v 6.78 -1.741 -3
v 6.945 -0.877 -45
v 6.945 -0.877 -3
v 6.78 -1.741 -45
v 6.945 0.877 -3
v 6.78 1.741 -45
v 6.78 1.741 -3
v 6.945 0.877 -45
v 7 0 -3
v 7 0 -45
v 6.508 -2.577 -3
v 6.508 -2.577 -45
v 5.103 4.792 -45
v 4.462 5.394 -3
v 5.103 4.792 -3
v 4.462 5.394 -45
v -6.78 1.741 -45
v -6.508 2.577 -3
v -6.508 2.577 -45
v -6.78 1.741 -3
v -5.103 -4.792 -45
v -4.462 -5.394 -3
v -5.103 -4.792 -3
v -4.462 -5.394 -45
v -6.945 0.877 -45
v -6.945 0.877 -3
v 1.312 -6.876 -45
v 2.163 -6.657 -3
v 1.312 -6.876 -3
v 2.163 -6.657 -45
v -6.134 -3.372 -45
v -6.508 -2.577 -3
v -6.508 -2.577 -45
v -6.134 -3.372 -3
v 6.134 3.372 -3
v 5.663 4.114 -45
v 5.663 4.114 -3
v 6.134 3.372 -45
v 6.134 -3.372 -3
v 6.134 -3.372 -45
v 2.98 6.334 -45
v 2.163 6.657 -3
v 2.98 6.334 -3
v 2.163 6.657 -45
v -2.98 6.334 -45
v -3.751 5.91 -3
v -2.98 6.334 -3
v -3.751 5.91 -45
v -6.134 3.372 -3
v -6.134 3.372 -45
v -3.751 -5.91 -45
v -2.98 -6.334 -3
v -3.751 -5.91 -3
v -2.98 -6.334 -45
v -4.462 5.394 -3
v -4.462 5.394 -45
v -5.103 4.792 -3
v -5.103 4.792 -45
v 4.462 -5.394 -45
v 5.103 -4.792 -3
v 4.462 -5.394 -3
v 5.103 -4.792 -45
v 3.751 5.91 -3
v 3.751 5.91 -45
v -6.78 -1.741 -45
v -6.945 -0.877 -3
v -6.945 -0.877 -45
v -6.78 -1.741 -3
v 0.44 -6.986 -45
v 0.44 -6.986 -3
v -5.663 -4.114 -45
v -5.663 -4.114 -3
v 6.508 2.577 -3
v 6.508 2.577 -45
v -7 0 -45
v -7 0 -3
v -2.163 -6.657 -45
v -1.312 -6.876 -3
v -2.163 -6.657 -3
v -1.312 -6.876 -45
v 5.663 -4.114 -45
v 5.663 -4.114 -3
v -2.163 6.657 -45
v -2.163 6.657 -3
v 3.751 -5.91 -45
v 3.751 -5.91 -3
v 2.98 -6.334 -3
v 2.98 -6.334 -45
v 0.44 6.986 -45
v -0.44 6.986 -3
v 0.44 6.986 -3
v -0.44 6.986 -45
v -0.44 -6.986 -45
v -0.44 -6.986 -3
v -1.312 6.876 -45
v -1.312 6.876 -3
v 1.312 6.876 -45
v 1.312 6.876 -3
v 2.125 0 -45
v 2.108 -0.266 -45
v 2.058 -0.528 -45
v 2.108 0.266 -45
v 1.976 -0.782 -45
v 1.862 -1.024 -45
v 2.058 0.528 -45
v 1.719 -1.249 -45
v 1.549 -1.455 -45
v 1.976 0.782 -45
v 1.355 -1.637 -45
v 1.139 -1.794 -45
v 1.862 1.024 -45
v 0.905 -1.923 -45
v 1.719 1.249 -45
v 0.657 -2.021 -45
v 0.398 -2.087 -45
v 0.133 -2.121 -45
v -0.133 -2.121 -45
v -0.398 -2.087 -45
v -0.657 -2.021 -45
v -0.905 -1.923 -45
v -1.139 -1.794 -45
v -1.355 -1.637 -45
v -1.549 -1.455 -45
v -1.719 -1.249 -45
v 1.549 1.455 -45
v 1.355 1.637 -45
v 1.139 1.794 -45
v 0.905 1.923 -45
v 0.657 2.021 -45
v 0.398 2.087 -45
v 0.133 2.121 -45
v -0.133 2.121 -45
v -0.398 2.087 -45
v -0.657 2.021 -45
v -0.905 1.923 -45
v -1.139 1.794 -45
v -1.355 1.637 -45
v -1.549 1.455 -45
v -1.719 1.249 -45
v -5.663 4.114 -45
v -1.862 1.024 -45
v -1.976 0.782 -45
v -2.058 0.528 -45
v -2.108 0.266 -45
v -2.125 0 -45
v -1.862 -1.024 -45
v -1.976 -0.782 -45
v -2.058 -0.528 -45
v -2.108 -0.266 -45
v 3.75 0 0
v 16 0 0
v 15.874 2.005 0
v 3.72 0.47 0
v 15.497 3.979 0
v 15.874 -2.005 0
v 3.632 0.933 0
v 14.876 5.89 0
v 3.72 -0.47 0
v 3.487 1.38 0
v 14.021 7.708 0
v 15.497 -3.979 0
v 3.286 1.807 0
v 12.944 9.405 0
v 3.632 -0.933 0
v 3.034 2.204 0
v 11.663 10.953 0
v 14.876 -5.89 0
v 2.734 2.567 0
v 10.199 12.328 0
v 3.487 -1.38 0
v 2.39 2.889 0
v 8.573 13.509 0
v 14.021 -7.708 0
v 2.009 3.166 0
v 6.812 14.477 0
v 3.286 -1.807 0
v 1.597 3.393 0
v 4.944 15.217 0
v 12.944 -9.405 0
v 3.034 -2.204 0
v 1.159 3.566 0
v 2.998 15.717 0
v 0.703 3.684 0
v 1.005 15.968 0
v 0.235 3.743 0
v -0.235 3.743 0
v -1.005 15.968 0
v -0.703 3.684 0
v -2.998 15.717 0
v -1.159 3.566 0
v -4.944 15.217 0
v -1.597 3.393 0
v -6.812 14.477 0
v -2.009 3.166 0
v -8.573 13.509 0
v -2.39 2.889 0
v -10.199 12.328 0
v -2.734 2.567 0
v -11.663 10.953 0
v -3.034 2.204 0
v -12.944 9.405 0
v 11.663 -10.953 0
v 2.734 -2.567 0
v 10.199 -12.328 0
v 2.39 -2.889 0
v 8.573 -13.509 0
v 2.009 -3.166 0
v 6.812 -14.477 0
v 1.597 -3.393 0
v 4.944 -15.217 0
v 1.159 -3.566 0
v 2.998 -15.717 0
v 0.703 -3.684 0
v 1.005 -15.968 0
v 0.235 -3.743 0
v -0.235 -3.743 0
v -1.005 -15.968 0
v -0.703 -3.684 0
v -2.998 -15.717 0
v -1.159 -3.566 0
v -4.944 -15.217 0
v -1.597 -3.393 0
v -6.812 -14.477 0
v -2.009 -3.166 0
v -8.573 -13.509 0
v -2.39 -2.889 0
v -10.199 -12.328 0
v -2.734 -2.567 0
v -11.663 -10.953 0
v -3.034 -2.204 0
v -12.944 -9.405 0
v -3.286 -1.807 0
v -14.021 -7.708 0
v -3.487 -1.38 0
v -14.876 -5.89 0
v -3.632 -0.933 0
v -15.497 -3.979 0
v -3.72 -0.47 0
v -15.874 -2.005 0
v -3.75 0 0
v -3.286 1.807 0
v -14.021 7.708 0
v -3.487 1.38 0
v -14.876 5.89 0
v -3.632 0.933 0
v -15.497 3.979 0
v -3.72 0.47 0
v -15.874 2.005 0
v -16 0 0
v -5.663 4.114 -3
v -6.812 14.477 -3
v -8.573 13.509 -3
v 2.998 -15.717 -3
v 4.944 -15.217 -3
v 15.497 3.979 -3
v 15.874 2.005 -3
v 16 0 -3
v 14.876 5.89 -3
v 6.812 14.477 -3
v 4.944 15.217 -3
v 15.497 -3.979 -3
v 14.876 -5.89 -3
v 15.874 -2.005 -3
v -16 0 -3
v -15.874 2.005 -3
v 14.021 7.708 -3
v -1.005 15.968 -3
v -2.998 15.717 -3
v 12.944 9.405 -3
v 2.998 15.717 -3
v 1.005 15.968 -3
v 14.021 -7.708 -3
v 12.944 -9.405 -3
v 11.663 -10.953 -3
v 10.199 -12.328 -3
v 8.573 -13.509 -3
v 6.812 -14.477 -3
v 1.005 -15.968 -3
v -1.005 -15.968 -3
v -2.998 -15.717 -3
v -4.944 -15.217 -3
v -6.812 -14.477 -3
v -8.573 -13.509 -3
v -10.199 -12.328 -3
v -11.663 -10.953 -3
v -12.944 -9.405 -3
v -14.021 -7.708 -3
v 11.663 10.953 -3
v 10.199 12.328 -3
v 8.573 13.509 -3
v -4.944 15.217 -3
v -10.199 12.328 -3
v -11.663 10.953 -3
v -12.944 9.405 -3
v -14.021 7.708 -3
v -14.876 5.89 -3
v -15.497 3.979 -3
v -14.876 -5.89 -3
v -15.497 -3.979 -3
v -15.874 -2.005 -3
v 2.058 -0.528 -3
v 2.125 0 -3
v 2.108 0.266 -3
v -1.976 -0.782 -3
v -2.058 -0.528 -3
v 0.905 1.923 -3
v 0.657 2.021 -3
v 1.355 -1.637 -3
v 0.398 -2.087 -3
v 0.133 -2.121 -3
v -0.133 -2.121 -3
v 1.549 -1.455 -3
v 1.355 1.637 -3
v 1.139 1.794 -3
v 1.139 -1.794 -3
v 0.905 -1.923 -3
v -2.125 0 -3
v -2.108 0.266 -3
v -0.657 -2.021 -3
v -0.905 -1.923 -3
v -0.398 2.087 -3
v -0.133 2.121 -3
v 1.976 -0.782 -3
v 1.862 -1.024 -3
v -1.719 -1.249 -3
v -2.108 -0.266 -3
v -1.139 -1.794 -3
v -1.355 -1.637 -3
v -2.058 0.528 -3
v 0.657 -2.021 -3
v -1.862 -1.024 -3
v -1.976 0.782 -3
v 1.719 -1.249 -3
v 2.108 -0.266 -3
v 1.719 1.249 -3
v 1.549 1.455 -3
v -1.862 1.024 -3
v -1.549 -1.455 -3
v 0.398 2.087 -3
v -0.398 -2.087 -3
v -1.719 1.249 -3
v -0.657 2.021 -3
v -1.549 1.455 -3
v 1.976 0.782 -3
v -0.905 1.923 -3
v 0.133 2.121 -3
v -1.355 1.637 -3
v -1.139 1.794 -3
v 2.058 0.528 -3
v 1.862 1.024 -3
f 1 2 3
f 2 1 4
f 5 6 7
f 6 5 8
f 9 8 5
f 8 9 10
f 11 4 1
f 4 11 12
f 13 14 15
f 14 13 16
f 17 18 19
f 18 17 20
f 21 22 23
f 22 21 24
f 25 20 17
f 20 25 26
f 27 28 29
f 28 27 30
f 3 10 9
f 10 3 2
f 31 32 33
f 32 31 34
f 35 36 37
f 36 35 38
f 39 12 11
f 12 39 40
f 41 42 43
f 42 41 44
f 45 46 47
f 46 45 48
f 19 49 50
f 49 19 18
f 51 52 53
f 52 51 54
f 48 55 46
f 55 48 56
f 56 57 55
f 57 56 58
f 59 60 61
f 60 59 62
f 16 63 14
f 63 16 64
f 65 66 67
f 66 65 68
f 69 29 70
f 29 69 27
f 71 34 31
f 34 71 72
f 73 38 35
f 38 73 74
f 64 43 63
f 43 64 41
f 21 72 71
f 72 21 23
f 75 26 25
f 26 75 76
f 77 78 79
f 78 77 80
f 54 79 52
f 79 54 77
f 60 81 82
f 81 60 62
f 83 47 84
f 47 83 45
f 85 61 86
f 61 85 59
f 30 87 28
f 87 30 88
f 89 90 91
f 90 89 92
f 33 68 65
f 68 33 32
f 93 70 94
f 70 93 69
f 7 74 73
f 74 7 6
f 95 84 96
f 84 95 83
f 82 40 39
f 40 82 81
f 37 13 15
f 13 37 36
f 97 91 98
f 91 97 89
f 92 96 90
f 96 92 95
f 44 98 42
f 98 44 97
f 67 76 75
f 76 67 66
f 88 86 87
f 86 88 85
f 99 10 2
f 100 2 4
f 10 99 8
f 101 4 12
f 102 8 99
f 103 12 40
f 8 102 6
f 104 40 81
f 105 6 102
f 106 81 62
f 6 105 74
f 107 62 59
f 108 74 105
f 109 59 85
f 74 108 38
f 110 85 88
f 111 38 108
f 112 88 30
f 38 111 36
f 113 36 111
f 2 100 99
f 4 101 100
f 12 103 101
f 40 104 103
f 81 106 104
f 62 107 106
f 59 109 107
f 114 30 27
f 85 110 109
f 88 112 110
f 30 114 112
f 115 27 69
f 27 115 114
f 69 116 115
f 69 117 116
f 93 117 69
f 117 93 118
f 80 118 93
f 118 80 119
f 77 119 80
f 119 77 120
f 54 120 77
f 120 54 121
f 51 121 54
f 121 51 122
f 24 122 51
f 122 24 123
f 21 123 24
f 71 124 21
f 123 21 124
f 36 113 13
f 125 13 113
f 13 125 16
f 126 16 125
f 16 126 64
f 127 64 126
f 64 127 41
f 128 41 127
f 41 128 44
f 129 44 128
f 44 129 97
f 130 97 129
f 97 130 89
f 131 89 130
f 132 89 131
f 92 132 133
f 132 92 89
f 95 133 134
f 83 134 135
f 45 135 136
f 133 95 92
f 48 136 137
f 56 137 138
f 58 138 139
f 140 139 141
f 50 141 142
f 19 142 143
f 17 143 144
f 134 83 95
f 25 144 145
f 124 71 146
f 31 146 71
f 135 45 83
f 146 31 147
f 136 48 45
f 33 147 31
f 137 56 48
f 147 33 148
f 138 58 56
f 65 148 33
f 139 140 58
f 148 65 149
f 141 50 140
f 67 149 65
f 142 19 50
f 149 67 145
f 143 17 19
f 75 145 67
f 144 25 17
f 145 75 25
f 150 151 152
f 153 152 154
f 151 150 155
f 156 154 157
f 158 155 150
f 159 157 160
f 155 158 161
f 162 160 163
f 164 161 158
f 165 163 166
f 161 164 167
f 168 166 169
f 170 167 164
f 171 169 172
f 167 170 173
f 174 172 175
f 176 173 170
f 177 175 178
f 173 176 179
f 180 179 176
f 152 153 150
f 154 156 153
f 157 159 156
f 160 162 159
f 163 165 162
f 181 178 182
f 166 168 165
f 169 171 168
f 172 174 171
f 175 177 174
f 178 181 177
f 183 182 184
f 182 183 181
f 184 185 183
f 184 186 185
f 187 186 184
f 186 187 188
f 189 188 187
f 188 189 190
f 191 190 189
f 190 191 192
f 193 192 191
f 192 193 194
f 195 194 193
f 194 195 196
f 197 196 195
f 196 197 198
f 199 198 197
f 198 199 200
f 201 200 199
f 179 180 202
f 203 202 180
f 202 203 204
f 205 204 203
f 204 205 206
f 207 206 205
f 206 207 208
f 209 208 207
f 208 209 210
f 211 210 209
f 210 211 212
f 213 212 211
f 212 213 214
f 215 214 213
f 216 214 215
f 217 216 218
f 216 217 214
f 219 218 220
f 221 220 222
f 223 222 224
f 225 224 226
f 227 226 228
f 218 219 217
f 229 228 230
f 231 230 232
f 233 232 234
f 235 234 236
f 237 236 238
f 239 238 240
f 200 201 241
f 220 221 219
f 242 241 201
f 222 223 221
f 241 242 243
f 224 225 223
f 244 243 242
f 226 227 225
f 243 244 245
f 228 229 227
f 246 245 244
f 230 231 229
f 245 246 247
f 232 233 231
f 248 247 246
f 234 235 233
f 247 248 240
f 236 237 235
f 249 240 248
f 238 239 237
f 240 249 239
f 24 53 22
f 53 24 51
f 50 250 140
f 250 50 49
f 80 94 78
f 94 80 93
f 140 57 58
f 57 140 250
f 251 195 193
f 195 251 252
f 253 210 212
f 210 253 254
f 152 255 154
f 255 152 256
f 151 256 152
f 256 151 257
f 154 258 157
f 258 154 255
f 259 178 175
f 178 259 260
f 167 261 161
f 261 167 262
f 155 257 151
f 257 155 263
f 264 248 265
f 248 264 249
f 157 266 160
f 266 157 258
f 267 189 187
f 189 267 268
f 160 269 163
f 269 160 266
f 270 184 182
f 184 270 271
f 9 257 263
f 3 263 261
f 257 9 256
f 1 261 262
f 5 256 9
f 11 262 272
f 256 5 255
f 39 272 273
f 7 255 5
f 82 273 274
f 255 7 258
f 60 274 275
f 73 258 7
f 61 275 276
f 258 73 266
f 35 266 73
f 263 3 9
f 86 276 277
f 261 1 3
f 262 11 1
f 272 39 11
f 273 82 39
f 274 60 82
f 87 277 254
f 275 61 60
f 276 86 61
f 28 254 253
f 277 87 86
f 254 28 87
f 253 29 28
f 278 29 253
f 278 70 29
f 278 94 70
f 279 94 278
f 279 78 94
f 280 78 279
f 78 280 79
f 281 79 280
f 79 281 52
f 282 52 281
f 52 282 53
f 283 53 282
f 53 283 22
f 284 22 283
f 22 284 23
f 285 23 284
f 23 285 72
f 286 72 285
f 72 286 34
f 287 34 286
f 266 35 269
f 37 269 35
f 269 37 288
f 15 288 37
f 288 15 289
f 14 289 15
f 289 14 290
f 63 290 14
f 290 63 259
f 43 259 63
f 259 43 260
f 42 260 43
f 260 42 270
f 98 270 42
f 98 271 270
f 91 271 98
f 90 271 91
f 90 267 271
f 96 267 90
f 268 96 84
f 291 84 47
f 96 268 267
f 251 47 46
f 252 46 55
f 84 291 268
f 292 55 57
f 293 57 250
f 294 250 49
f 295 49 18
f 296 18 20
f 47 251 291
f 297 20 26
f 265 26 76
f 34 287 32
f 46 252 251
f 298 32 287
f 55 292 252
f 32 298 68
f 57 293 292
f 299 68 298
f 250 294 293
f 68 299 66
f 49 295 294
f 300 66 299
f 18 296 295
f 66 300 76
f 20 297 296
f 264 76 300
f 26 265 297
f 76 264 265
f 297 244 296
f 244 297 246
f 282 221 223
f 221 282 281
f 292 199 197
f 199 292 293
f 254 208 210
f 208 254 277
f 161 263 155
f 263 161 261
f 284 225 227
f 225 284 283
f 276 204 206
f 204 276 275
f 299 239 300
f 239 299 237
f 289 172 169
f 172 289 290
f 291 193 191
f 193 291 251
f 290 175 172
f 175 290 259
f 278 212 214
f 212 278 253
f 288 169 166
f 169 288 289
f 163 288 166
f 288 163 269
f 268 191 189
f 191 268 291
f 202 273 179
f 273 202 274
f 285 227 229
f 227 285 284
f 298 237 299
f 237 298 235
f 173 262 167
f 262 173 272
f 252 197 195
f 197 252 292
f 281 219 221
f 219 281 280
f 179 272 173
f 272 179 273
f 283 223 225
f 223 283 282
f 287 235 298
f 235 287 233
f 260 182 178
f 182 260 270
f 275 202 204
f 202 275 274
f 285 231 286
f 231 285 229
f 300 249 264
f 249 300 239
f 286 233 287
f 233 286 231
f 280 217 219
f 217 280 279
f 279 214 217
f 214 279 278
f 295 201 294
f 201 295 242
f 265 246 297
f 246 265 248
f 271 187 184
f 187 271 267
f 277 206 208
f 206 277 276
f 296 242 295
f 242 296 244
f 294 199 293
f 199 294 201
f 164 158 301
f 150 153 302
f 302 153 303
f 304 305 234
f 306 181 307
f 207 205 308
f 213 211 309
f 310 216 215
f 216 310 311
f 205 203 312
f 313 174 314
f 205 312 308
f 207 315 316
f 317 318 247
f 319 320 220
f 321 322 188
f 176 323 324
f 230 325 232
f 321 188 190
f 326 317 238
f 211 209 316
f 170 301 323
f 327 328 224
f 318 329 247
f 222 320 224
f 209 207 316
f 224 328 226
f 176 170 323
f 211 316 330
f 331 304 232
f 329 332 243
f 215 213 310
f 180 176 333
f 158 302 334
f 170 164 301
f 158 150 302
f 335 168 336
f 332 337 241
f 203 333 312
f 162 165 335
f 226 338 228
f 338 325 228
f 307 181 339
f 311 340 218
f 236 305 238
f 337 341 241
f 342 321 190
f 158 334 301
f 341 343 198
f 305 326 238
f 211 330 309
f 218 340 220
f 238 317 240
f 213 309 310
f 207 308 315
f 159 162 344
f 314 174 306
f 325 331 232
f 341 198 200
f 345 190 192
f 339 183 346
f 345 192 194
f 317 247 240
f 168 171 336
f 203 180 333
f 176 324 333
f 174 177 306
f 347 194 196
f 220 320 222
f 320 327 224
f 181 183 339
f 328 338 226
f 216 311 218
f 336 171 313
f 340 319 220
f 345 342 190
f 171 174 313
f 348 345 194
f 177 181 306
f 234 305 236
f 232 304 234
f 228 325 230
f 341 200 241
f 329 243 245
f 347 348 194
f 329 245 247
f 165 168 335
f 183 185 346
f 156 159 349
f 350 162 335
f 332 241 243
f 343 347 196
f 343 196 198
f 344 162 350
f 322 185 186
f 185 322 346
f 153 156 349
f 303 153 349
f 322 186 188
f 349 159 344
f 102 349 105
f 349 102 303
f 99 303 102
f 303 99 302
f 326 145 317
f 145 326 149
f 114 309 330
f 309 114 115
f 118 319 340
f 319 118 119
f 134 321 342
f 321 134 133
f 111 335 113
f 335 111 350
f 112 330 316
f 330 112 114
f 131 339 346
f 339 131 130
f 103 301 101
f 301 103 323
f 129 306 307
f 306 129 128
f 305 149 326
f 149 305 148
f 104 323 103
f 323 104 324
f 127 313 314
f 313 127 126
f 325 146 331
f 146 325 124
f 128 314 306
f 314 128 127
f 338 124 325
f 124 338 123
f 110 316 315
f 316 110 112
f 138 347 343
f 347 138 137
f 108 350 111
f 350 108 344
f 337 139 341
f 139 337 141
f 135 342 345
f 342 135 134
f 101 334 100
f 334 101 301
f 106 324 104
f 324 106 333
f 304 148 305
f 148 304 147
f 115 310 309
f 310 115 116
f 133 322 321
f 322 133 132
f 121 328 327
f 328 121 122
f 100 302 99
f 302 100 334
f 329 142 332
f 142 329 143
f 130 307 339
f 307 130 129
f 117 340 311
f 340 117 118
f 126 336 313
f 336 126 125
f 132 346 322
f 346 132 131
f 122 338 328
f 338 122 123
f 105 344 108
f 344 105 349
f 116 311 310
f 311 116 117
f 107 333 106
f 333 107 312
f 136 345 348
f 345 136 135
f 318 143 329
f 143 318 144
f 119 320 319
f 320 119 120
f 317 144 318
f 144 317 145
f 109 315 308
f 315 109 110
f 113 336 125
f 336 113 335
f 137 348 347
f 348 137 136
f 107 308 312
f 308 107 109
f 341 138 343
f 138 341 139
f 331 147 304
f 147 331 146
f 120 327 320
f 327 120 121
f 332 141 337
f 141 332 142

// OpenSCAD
$fn = 50;


difference() {
	union() {
		translate(v = [0, 0, -45.0000000000]) {
			cylinder(h = 45, r = 7.0000000000);
		}
		translate(v = [0, 0, -3.0000000000]) {
			cylinder(h = 3, r = 16.0000000000);
		}
	}
	union() {
		translate(v = [0, 0, 0]) {
			rotate(a = [0, 0, 0]) {
				difference() {
					union() {
						#translate(v = [0, 0, -45.0000000000]) {
							cylinder(h = 45, r = 2.0000000000);
						}
						#translate(v = [0, 0, -3]) {
							cylinder(h = 3, r1 = 2.1250000000, r2 = 3.7500000000);
						}
						#translate(v = [0, 0, -45.0000000000]) {
							cylinder(h = 45, r = 2.1250000000);
						}
						#translate(v = [0, 0, -45.0000000000]) {
							cylinder(h = 45, r = 2.0000000000);
						}
					}
					union();
				}
			}
		}
	}
}
